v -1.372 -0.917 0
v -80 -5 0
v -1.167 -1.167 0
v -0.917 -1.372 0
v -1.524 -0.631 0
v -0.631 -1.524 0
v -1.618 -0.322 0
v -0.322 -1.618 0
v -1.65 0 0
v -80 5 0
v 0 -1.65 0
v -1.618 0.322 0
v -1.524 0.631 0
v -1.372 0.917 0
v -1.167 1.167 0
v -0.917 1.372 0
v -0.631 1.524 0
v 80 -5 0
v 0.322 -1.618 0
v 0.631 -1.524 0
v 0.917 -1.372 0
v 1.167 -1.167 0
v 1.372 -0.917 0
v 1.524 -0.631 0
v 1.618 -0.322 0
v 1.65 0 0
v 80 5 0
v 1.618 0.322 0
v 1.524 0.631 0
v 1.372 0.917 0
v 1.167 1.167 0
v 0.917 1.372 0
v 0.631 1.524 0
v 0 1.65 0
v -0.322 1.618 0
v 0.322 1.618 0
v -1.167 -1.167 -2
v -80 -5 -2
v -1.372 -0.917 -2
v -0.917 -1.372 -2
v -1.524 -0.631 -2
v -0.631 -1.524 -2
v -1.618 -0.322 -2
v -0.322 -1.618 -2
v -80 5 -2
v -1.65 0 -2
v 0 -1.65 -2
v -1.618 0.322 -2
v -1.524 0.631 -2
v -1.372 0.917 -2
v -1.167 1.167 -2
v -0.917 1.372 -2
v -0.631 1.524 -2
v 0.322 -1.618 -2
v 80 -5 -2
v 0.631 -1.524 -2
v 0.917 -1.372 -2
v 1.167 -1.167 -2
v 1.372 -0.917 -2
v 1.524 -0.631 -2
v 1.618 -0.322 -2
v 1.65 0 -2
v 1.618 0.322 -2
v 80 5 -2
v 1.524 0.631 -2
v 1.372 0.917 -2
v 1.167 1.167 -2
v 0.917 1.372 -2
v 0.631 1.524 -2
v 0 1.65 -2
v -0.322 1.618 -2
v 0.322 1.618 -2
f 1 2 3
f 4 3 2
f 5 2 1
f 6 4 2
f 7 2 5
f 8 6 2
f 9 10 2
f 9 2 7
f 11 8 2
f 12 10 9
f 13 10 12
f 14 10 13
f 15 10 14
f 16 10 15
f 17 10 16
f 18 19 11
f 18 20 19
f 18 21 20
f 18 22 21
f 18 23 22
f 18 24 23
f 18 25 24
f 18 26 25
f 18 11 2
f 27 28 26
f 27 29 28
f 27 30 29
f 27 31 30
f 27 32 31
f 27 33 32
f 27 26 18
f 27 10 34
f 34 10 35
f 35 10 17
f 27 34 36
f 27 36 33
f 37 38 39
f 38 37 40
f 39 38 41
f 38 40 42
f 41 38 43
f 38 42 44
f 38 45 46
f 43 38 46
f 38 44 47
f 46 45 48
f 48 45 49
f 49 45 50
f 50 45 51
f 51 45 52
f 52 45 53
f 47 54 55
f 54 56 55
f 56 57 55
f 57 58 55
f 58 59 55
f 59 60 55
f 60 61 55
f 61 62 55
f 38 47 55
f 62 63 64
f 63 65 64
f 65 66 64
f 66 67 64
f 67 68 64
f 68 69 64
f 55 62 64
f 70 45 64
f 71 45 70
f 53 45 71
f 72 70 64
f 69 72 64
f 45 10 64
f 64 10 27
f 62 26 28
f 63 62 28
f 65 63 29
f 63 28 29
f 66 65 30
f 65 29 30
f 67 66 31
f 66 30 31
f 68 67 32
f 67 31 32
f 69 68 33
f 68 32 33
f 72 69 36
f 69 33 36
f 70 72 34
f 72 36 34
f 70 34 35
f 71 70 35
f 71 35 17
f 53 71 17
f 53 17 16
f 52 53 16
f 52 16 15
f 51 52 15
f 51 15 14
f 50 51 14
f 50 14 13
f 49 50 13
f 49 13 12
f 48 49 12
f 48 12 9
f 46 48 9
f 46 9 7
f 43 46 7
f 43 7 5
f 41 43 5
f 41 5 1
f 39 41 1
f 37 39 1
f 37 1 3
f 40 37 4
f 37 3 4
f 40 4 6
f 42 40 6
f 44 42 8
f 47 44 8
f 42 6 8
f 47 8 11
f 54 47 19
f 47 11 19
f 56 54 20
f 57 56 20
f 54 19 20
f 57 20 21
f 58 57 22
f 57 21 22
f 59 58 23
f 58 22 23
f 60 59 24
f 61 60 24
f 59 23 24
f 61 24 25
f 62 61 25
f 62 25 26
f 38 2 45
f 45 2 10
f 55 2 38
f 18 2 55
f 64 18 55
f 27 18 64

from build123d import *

# Parameters (mm, degrees)
ESBO_O1_W                                      = 160
ESBO_O1_H                                      = 10
FLANGE_BASE1_DEPTH                             = 2
BROCA_DE_ROSQUEAR_DE_CANO_PARA_TARRAXA_D_D     = 3.3
BROCA_DE_ROSQUEAR_DE_CANO_PARA_TARRAXA_D_DEPTH = 4
BROCA_DE_ROSQUEAR_DE_CANO_PARA_TARRAXA_D_TIP   = 0.991420021


# Sheet-metal steps are written as plain solids
with BuildPart() as part:
    # Esboço1 → Flange-base1 (new body)
    with BuildSketch(Plane.XY):
        Rectangle(ESBO_O1_W, ESBO_O1_H)
    extrude(amount=-FLANGE_BASE1_DEPTH)

    # Broca de rosquear de cano para tarraxa de 1/81
    with Locations(Plane(origin=(0, 0, -2), x_dir=(-1, 0, 0), z_dir=(0, 0, -1))):
        with Locations((0, 0)):
            Hole(BROCA_DE_ROSQUEAR_DE_CANO_PARA_TARRAXA_D_D / 2, depth=BROCA_DE_ROSQUEAR_DE_CANO_PARA_TARRAXA_D_DEPTH)
            with Locations((0, 0, -(BROCA_DE_ROSQUEAR_DE_CANO_PARA_TARRAXA_D_DEPTH + BROCA_DE_ROSQUEAR_DE_CANO_PARA_TARRAXA_D_TIP / 2))):  # 118° drill point
                Cone(0, BROCA_DE_ROSQUEAR_DE_CANO_PARA_TARRAXA_D_D / 2, BROCA_DE_ROSQUEAR_DE_CANO_PARA_TARRAXA_D_TIP, mode=Mode.SUBTRACT)


solid = part.part
